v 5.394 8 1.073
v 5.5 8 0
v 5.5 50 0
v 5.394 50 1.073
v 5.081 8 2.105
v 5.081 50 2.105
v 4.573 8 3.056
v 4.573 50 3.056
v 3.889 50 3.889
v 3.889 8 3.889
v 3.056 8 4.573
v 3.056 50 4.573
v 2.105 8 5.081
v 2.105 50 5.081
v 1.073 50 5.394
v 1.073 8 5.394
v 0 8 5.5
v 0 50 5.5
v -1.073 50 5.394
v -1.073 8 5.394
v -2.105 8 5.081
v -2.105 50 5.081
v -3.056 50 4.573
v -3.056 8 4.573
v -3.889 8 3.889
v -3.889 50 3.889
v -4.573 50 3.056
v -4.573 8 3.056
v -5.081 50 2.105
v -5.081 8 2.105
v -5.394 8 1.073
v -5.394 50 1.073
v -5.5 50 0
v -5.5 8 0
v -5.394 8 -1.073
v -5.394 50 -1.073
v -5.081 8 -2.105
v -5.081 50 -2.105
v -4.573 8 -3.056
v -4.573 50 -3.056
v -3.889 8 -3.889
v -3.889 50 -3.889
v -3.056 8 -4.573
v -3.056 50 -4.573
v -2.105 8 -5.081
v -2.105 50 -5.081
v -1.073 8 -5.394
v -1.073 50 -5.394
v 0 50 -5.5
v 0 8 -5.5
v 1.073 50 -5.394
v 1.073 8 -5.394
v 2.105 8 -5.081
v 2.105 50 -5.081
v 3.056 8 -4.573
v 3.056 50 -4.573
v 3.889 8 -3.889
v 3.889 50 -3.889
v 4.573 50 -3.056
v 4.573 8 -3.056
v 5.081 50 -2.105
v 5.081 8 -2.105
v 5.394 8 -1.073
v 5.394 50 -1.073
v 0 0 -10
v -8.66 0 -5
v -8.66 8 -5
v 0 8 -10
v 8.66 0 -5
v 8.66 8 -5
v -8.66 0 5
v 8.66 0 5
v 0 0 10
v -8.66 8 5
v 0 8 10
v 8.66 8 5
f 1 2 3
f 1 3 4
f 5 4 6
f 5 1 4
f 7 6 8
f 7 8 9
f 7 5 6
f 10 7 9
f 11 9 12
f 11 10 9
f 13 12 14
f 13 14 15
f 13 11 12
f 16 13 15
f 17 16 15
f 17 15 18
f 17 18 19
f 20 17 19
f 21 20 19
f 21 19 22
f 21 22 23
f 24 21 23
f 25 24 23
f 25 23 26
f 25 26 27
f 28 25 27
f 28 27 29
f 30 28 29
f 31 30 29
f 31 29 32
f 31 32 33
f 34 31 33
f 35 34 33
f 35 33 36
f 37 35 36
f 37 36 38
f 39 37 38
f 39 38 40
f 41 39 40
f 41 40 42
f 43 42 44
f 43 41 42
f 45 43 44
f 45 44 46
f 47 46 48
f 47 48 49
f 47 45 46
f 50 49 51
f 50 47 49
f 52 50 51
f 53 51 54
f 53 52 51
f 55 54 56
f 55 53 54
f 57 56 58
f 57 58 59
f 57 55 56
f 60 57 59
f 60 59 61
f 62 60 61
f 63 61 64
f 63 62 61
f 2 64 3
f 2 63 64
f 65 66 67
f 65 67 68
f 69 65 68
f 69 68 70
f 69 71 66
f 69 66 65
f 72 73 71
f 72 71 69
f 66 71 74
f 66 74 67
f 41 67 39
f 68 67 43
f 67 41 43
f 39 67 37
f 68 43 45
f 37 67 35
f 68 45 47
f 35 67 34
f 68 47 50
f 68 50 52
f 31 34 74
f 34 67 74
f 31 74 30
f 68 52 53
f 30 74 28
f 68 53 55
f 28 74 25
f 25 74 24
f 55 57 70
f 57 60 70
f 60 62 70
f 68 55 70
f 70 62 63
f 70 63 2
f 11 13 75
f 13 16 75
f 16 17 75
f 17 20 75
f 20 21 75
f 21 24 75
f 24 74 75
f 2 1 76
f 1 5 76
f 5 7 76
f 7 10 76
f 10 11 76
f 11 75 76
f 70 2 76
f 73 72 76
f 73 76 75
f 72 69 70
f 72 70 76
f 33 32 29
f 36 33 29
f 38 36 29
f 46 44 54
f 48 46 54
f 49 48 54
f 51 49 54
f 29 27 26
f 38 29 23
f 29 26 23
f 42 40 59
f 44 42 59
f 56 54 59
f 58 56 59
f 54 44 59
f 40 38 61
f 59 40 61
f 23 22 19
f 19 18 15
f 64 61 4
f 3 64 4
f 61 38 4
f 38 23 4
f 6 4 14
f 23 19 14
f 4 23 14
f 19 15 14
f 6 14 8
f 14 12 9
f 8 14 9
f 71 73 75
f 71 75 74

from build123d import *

# Parameters (mm, degrees)
F0_R     = 5.5
F1_DEPTH = 8
F2_R     = 5.5
F3_DEPTH = 50


with BuildPart() as f1:
    # F0 (on Front) → F1 (new body)
    with BuildSketch(Plane.XZ):
        Polygon((8.660254, 5), (0, 10), (-8.660254, 5), (-8.660254, -5), (0, -10), (8.660254, -5), align=None)
        Circle(F0_R, mode=Mode.SUBTRACT)
    extrude(amount=-F1_DEPTH)

    # F2 (on Front) → F3 (join)
    with BuildSketch(Plane.XZ):
        Circle(F2_R)
    extrude(amount=-F3_DEPTH)


solid = f1.part
